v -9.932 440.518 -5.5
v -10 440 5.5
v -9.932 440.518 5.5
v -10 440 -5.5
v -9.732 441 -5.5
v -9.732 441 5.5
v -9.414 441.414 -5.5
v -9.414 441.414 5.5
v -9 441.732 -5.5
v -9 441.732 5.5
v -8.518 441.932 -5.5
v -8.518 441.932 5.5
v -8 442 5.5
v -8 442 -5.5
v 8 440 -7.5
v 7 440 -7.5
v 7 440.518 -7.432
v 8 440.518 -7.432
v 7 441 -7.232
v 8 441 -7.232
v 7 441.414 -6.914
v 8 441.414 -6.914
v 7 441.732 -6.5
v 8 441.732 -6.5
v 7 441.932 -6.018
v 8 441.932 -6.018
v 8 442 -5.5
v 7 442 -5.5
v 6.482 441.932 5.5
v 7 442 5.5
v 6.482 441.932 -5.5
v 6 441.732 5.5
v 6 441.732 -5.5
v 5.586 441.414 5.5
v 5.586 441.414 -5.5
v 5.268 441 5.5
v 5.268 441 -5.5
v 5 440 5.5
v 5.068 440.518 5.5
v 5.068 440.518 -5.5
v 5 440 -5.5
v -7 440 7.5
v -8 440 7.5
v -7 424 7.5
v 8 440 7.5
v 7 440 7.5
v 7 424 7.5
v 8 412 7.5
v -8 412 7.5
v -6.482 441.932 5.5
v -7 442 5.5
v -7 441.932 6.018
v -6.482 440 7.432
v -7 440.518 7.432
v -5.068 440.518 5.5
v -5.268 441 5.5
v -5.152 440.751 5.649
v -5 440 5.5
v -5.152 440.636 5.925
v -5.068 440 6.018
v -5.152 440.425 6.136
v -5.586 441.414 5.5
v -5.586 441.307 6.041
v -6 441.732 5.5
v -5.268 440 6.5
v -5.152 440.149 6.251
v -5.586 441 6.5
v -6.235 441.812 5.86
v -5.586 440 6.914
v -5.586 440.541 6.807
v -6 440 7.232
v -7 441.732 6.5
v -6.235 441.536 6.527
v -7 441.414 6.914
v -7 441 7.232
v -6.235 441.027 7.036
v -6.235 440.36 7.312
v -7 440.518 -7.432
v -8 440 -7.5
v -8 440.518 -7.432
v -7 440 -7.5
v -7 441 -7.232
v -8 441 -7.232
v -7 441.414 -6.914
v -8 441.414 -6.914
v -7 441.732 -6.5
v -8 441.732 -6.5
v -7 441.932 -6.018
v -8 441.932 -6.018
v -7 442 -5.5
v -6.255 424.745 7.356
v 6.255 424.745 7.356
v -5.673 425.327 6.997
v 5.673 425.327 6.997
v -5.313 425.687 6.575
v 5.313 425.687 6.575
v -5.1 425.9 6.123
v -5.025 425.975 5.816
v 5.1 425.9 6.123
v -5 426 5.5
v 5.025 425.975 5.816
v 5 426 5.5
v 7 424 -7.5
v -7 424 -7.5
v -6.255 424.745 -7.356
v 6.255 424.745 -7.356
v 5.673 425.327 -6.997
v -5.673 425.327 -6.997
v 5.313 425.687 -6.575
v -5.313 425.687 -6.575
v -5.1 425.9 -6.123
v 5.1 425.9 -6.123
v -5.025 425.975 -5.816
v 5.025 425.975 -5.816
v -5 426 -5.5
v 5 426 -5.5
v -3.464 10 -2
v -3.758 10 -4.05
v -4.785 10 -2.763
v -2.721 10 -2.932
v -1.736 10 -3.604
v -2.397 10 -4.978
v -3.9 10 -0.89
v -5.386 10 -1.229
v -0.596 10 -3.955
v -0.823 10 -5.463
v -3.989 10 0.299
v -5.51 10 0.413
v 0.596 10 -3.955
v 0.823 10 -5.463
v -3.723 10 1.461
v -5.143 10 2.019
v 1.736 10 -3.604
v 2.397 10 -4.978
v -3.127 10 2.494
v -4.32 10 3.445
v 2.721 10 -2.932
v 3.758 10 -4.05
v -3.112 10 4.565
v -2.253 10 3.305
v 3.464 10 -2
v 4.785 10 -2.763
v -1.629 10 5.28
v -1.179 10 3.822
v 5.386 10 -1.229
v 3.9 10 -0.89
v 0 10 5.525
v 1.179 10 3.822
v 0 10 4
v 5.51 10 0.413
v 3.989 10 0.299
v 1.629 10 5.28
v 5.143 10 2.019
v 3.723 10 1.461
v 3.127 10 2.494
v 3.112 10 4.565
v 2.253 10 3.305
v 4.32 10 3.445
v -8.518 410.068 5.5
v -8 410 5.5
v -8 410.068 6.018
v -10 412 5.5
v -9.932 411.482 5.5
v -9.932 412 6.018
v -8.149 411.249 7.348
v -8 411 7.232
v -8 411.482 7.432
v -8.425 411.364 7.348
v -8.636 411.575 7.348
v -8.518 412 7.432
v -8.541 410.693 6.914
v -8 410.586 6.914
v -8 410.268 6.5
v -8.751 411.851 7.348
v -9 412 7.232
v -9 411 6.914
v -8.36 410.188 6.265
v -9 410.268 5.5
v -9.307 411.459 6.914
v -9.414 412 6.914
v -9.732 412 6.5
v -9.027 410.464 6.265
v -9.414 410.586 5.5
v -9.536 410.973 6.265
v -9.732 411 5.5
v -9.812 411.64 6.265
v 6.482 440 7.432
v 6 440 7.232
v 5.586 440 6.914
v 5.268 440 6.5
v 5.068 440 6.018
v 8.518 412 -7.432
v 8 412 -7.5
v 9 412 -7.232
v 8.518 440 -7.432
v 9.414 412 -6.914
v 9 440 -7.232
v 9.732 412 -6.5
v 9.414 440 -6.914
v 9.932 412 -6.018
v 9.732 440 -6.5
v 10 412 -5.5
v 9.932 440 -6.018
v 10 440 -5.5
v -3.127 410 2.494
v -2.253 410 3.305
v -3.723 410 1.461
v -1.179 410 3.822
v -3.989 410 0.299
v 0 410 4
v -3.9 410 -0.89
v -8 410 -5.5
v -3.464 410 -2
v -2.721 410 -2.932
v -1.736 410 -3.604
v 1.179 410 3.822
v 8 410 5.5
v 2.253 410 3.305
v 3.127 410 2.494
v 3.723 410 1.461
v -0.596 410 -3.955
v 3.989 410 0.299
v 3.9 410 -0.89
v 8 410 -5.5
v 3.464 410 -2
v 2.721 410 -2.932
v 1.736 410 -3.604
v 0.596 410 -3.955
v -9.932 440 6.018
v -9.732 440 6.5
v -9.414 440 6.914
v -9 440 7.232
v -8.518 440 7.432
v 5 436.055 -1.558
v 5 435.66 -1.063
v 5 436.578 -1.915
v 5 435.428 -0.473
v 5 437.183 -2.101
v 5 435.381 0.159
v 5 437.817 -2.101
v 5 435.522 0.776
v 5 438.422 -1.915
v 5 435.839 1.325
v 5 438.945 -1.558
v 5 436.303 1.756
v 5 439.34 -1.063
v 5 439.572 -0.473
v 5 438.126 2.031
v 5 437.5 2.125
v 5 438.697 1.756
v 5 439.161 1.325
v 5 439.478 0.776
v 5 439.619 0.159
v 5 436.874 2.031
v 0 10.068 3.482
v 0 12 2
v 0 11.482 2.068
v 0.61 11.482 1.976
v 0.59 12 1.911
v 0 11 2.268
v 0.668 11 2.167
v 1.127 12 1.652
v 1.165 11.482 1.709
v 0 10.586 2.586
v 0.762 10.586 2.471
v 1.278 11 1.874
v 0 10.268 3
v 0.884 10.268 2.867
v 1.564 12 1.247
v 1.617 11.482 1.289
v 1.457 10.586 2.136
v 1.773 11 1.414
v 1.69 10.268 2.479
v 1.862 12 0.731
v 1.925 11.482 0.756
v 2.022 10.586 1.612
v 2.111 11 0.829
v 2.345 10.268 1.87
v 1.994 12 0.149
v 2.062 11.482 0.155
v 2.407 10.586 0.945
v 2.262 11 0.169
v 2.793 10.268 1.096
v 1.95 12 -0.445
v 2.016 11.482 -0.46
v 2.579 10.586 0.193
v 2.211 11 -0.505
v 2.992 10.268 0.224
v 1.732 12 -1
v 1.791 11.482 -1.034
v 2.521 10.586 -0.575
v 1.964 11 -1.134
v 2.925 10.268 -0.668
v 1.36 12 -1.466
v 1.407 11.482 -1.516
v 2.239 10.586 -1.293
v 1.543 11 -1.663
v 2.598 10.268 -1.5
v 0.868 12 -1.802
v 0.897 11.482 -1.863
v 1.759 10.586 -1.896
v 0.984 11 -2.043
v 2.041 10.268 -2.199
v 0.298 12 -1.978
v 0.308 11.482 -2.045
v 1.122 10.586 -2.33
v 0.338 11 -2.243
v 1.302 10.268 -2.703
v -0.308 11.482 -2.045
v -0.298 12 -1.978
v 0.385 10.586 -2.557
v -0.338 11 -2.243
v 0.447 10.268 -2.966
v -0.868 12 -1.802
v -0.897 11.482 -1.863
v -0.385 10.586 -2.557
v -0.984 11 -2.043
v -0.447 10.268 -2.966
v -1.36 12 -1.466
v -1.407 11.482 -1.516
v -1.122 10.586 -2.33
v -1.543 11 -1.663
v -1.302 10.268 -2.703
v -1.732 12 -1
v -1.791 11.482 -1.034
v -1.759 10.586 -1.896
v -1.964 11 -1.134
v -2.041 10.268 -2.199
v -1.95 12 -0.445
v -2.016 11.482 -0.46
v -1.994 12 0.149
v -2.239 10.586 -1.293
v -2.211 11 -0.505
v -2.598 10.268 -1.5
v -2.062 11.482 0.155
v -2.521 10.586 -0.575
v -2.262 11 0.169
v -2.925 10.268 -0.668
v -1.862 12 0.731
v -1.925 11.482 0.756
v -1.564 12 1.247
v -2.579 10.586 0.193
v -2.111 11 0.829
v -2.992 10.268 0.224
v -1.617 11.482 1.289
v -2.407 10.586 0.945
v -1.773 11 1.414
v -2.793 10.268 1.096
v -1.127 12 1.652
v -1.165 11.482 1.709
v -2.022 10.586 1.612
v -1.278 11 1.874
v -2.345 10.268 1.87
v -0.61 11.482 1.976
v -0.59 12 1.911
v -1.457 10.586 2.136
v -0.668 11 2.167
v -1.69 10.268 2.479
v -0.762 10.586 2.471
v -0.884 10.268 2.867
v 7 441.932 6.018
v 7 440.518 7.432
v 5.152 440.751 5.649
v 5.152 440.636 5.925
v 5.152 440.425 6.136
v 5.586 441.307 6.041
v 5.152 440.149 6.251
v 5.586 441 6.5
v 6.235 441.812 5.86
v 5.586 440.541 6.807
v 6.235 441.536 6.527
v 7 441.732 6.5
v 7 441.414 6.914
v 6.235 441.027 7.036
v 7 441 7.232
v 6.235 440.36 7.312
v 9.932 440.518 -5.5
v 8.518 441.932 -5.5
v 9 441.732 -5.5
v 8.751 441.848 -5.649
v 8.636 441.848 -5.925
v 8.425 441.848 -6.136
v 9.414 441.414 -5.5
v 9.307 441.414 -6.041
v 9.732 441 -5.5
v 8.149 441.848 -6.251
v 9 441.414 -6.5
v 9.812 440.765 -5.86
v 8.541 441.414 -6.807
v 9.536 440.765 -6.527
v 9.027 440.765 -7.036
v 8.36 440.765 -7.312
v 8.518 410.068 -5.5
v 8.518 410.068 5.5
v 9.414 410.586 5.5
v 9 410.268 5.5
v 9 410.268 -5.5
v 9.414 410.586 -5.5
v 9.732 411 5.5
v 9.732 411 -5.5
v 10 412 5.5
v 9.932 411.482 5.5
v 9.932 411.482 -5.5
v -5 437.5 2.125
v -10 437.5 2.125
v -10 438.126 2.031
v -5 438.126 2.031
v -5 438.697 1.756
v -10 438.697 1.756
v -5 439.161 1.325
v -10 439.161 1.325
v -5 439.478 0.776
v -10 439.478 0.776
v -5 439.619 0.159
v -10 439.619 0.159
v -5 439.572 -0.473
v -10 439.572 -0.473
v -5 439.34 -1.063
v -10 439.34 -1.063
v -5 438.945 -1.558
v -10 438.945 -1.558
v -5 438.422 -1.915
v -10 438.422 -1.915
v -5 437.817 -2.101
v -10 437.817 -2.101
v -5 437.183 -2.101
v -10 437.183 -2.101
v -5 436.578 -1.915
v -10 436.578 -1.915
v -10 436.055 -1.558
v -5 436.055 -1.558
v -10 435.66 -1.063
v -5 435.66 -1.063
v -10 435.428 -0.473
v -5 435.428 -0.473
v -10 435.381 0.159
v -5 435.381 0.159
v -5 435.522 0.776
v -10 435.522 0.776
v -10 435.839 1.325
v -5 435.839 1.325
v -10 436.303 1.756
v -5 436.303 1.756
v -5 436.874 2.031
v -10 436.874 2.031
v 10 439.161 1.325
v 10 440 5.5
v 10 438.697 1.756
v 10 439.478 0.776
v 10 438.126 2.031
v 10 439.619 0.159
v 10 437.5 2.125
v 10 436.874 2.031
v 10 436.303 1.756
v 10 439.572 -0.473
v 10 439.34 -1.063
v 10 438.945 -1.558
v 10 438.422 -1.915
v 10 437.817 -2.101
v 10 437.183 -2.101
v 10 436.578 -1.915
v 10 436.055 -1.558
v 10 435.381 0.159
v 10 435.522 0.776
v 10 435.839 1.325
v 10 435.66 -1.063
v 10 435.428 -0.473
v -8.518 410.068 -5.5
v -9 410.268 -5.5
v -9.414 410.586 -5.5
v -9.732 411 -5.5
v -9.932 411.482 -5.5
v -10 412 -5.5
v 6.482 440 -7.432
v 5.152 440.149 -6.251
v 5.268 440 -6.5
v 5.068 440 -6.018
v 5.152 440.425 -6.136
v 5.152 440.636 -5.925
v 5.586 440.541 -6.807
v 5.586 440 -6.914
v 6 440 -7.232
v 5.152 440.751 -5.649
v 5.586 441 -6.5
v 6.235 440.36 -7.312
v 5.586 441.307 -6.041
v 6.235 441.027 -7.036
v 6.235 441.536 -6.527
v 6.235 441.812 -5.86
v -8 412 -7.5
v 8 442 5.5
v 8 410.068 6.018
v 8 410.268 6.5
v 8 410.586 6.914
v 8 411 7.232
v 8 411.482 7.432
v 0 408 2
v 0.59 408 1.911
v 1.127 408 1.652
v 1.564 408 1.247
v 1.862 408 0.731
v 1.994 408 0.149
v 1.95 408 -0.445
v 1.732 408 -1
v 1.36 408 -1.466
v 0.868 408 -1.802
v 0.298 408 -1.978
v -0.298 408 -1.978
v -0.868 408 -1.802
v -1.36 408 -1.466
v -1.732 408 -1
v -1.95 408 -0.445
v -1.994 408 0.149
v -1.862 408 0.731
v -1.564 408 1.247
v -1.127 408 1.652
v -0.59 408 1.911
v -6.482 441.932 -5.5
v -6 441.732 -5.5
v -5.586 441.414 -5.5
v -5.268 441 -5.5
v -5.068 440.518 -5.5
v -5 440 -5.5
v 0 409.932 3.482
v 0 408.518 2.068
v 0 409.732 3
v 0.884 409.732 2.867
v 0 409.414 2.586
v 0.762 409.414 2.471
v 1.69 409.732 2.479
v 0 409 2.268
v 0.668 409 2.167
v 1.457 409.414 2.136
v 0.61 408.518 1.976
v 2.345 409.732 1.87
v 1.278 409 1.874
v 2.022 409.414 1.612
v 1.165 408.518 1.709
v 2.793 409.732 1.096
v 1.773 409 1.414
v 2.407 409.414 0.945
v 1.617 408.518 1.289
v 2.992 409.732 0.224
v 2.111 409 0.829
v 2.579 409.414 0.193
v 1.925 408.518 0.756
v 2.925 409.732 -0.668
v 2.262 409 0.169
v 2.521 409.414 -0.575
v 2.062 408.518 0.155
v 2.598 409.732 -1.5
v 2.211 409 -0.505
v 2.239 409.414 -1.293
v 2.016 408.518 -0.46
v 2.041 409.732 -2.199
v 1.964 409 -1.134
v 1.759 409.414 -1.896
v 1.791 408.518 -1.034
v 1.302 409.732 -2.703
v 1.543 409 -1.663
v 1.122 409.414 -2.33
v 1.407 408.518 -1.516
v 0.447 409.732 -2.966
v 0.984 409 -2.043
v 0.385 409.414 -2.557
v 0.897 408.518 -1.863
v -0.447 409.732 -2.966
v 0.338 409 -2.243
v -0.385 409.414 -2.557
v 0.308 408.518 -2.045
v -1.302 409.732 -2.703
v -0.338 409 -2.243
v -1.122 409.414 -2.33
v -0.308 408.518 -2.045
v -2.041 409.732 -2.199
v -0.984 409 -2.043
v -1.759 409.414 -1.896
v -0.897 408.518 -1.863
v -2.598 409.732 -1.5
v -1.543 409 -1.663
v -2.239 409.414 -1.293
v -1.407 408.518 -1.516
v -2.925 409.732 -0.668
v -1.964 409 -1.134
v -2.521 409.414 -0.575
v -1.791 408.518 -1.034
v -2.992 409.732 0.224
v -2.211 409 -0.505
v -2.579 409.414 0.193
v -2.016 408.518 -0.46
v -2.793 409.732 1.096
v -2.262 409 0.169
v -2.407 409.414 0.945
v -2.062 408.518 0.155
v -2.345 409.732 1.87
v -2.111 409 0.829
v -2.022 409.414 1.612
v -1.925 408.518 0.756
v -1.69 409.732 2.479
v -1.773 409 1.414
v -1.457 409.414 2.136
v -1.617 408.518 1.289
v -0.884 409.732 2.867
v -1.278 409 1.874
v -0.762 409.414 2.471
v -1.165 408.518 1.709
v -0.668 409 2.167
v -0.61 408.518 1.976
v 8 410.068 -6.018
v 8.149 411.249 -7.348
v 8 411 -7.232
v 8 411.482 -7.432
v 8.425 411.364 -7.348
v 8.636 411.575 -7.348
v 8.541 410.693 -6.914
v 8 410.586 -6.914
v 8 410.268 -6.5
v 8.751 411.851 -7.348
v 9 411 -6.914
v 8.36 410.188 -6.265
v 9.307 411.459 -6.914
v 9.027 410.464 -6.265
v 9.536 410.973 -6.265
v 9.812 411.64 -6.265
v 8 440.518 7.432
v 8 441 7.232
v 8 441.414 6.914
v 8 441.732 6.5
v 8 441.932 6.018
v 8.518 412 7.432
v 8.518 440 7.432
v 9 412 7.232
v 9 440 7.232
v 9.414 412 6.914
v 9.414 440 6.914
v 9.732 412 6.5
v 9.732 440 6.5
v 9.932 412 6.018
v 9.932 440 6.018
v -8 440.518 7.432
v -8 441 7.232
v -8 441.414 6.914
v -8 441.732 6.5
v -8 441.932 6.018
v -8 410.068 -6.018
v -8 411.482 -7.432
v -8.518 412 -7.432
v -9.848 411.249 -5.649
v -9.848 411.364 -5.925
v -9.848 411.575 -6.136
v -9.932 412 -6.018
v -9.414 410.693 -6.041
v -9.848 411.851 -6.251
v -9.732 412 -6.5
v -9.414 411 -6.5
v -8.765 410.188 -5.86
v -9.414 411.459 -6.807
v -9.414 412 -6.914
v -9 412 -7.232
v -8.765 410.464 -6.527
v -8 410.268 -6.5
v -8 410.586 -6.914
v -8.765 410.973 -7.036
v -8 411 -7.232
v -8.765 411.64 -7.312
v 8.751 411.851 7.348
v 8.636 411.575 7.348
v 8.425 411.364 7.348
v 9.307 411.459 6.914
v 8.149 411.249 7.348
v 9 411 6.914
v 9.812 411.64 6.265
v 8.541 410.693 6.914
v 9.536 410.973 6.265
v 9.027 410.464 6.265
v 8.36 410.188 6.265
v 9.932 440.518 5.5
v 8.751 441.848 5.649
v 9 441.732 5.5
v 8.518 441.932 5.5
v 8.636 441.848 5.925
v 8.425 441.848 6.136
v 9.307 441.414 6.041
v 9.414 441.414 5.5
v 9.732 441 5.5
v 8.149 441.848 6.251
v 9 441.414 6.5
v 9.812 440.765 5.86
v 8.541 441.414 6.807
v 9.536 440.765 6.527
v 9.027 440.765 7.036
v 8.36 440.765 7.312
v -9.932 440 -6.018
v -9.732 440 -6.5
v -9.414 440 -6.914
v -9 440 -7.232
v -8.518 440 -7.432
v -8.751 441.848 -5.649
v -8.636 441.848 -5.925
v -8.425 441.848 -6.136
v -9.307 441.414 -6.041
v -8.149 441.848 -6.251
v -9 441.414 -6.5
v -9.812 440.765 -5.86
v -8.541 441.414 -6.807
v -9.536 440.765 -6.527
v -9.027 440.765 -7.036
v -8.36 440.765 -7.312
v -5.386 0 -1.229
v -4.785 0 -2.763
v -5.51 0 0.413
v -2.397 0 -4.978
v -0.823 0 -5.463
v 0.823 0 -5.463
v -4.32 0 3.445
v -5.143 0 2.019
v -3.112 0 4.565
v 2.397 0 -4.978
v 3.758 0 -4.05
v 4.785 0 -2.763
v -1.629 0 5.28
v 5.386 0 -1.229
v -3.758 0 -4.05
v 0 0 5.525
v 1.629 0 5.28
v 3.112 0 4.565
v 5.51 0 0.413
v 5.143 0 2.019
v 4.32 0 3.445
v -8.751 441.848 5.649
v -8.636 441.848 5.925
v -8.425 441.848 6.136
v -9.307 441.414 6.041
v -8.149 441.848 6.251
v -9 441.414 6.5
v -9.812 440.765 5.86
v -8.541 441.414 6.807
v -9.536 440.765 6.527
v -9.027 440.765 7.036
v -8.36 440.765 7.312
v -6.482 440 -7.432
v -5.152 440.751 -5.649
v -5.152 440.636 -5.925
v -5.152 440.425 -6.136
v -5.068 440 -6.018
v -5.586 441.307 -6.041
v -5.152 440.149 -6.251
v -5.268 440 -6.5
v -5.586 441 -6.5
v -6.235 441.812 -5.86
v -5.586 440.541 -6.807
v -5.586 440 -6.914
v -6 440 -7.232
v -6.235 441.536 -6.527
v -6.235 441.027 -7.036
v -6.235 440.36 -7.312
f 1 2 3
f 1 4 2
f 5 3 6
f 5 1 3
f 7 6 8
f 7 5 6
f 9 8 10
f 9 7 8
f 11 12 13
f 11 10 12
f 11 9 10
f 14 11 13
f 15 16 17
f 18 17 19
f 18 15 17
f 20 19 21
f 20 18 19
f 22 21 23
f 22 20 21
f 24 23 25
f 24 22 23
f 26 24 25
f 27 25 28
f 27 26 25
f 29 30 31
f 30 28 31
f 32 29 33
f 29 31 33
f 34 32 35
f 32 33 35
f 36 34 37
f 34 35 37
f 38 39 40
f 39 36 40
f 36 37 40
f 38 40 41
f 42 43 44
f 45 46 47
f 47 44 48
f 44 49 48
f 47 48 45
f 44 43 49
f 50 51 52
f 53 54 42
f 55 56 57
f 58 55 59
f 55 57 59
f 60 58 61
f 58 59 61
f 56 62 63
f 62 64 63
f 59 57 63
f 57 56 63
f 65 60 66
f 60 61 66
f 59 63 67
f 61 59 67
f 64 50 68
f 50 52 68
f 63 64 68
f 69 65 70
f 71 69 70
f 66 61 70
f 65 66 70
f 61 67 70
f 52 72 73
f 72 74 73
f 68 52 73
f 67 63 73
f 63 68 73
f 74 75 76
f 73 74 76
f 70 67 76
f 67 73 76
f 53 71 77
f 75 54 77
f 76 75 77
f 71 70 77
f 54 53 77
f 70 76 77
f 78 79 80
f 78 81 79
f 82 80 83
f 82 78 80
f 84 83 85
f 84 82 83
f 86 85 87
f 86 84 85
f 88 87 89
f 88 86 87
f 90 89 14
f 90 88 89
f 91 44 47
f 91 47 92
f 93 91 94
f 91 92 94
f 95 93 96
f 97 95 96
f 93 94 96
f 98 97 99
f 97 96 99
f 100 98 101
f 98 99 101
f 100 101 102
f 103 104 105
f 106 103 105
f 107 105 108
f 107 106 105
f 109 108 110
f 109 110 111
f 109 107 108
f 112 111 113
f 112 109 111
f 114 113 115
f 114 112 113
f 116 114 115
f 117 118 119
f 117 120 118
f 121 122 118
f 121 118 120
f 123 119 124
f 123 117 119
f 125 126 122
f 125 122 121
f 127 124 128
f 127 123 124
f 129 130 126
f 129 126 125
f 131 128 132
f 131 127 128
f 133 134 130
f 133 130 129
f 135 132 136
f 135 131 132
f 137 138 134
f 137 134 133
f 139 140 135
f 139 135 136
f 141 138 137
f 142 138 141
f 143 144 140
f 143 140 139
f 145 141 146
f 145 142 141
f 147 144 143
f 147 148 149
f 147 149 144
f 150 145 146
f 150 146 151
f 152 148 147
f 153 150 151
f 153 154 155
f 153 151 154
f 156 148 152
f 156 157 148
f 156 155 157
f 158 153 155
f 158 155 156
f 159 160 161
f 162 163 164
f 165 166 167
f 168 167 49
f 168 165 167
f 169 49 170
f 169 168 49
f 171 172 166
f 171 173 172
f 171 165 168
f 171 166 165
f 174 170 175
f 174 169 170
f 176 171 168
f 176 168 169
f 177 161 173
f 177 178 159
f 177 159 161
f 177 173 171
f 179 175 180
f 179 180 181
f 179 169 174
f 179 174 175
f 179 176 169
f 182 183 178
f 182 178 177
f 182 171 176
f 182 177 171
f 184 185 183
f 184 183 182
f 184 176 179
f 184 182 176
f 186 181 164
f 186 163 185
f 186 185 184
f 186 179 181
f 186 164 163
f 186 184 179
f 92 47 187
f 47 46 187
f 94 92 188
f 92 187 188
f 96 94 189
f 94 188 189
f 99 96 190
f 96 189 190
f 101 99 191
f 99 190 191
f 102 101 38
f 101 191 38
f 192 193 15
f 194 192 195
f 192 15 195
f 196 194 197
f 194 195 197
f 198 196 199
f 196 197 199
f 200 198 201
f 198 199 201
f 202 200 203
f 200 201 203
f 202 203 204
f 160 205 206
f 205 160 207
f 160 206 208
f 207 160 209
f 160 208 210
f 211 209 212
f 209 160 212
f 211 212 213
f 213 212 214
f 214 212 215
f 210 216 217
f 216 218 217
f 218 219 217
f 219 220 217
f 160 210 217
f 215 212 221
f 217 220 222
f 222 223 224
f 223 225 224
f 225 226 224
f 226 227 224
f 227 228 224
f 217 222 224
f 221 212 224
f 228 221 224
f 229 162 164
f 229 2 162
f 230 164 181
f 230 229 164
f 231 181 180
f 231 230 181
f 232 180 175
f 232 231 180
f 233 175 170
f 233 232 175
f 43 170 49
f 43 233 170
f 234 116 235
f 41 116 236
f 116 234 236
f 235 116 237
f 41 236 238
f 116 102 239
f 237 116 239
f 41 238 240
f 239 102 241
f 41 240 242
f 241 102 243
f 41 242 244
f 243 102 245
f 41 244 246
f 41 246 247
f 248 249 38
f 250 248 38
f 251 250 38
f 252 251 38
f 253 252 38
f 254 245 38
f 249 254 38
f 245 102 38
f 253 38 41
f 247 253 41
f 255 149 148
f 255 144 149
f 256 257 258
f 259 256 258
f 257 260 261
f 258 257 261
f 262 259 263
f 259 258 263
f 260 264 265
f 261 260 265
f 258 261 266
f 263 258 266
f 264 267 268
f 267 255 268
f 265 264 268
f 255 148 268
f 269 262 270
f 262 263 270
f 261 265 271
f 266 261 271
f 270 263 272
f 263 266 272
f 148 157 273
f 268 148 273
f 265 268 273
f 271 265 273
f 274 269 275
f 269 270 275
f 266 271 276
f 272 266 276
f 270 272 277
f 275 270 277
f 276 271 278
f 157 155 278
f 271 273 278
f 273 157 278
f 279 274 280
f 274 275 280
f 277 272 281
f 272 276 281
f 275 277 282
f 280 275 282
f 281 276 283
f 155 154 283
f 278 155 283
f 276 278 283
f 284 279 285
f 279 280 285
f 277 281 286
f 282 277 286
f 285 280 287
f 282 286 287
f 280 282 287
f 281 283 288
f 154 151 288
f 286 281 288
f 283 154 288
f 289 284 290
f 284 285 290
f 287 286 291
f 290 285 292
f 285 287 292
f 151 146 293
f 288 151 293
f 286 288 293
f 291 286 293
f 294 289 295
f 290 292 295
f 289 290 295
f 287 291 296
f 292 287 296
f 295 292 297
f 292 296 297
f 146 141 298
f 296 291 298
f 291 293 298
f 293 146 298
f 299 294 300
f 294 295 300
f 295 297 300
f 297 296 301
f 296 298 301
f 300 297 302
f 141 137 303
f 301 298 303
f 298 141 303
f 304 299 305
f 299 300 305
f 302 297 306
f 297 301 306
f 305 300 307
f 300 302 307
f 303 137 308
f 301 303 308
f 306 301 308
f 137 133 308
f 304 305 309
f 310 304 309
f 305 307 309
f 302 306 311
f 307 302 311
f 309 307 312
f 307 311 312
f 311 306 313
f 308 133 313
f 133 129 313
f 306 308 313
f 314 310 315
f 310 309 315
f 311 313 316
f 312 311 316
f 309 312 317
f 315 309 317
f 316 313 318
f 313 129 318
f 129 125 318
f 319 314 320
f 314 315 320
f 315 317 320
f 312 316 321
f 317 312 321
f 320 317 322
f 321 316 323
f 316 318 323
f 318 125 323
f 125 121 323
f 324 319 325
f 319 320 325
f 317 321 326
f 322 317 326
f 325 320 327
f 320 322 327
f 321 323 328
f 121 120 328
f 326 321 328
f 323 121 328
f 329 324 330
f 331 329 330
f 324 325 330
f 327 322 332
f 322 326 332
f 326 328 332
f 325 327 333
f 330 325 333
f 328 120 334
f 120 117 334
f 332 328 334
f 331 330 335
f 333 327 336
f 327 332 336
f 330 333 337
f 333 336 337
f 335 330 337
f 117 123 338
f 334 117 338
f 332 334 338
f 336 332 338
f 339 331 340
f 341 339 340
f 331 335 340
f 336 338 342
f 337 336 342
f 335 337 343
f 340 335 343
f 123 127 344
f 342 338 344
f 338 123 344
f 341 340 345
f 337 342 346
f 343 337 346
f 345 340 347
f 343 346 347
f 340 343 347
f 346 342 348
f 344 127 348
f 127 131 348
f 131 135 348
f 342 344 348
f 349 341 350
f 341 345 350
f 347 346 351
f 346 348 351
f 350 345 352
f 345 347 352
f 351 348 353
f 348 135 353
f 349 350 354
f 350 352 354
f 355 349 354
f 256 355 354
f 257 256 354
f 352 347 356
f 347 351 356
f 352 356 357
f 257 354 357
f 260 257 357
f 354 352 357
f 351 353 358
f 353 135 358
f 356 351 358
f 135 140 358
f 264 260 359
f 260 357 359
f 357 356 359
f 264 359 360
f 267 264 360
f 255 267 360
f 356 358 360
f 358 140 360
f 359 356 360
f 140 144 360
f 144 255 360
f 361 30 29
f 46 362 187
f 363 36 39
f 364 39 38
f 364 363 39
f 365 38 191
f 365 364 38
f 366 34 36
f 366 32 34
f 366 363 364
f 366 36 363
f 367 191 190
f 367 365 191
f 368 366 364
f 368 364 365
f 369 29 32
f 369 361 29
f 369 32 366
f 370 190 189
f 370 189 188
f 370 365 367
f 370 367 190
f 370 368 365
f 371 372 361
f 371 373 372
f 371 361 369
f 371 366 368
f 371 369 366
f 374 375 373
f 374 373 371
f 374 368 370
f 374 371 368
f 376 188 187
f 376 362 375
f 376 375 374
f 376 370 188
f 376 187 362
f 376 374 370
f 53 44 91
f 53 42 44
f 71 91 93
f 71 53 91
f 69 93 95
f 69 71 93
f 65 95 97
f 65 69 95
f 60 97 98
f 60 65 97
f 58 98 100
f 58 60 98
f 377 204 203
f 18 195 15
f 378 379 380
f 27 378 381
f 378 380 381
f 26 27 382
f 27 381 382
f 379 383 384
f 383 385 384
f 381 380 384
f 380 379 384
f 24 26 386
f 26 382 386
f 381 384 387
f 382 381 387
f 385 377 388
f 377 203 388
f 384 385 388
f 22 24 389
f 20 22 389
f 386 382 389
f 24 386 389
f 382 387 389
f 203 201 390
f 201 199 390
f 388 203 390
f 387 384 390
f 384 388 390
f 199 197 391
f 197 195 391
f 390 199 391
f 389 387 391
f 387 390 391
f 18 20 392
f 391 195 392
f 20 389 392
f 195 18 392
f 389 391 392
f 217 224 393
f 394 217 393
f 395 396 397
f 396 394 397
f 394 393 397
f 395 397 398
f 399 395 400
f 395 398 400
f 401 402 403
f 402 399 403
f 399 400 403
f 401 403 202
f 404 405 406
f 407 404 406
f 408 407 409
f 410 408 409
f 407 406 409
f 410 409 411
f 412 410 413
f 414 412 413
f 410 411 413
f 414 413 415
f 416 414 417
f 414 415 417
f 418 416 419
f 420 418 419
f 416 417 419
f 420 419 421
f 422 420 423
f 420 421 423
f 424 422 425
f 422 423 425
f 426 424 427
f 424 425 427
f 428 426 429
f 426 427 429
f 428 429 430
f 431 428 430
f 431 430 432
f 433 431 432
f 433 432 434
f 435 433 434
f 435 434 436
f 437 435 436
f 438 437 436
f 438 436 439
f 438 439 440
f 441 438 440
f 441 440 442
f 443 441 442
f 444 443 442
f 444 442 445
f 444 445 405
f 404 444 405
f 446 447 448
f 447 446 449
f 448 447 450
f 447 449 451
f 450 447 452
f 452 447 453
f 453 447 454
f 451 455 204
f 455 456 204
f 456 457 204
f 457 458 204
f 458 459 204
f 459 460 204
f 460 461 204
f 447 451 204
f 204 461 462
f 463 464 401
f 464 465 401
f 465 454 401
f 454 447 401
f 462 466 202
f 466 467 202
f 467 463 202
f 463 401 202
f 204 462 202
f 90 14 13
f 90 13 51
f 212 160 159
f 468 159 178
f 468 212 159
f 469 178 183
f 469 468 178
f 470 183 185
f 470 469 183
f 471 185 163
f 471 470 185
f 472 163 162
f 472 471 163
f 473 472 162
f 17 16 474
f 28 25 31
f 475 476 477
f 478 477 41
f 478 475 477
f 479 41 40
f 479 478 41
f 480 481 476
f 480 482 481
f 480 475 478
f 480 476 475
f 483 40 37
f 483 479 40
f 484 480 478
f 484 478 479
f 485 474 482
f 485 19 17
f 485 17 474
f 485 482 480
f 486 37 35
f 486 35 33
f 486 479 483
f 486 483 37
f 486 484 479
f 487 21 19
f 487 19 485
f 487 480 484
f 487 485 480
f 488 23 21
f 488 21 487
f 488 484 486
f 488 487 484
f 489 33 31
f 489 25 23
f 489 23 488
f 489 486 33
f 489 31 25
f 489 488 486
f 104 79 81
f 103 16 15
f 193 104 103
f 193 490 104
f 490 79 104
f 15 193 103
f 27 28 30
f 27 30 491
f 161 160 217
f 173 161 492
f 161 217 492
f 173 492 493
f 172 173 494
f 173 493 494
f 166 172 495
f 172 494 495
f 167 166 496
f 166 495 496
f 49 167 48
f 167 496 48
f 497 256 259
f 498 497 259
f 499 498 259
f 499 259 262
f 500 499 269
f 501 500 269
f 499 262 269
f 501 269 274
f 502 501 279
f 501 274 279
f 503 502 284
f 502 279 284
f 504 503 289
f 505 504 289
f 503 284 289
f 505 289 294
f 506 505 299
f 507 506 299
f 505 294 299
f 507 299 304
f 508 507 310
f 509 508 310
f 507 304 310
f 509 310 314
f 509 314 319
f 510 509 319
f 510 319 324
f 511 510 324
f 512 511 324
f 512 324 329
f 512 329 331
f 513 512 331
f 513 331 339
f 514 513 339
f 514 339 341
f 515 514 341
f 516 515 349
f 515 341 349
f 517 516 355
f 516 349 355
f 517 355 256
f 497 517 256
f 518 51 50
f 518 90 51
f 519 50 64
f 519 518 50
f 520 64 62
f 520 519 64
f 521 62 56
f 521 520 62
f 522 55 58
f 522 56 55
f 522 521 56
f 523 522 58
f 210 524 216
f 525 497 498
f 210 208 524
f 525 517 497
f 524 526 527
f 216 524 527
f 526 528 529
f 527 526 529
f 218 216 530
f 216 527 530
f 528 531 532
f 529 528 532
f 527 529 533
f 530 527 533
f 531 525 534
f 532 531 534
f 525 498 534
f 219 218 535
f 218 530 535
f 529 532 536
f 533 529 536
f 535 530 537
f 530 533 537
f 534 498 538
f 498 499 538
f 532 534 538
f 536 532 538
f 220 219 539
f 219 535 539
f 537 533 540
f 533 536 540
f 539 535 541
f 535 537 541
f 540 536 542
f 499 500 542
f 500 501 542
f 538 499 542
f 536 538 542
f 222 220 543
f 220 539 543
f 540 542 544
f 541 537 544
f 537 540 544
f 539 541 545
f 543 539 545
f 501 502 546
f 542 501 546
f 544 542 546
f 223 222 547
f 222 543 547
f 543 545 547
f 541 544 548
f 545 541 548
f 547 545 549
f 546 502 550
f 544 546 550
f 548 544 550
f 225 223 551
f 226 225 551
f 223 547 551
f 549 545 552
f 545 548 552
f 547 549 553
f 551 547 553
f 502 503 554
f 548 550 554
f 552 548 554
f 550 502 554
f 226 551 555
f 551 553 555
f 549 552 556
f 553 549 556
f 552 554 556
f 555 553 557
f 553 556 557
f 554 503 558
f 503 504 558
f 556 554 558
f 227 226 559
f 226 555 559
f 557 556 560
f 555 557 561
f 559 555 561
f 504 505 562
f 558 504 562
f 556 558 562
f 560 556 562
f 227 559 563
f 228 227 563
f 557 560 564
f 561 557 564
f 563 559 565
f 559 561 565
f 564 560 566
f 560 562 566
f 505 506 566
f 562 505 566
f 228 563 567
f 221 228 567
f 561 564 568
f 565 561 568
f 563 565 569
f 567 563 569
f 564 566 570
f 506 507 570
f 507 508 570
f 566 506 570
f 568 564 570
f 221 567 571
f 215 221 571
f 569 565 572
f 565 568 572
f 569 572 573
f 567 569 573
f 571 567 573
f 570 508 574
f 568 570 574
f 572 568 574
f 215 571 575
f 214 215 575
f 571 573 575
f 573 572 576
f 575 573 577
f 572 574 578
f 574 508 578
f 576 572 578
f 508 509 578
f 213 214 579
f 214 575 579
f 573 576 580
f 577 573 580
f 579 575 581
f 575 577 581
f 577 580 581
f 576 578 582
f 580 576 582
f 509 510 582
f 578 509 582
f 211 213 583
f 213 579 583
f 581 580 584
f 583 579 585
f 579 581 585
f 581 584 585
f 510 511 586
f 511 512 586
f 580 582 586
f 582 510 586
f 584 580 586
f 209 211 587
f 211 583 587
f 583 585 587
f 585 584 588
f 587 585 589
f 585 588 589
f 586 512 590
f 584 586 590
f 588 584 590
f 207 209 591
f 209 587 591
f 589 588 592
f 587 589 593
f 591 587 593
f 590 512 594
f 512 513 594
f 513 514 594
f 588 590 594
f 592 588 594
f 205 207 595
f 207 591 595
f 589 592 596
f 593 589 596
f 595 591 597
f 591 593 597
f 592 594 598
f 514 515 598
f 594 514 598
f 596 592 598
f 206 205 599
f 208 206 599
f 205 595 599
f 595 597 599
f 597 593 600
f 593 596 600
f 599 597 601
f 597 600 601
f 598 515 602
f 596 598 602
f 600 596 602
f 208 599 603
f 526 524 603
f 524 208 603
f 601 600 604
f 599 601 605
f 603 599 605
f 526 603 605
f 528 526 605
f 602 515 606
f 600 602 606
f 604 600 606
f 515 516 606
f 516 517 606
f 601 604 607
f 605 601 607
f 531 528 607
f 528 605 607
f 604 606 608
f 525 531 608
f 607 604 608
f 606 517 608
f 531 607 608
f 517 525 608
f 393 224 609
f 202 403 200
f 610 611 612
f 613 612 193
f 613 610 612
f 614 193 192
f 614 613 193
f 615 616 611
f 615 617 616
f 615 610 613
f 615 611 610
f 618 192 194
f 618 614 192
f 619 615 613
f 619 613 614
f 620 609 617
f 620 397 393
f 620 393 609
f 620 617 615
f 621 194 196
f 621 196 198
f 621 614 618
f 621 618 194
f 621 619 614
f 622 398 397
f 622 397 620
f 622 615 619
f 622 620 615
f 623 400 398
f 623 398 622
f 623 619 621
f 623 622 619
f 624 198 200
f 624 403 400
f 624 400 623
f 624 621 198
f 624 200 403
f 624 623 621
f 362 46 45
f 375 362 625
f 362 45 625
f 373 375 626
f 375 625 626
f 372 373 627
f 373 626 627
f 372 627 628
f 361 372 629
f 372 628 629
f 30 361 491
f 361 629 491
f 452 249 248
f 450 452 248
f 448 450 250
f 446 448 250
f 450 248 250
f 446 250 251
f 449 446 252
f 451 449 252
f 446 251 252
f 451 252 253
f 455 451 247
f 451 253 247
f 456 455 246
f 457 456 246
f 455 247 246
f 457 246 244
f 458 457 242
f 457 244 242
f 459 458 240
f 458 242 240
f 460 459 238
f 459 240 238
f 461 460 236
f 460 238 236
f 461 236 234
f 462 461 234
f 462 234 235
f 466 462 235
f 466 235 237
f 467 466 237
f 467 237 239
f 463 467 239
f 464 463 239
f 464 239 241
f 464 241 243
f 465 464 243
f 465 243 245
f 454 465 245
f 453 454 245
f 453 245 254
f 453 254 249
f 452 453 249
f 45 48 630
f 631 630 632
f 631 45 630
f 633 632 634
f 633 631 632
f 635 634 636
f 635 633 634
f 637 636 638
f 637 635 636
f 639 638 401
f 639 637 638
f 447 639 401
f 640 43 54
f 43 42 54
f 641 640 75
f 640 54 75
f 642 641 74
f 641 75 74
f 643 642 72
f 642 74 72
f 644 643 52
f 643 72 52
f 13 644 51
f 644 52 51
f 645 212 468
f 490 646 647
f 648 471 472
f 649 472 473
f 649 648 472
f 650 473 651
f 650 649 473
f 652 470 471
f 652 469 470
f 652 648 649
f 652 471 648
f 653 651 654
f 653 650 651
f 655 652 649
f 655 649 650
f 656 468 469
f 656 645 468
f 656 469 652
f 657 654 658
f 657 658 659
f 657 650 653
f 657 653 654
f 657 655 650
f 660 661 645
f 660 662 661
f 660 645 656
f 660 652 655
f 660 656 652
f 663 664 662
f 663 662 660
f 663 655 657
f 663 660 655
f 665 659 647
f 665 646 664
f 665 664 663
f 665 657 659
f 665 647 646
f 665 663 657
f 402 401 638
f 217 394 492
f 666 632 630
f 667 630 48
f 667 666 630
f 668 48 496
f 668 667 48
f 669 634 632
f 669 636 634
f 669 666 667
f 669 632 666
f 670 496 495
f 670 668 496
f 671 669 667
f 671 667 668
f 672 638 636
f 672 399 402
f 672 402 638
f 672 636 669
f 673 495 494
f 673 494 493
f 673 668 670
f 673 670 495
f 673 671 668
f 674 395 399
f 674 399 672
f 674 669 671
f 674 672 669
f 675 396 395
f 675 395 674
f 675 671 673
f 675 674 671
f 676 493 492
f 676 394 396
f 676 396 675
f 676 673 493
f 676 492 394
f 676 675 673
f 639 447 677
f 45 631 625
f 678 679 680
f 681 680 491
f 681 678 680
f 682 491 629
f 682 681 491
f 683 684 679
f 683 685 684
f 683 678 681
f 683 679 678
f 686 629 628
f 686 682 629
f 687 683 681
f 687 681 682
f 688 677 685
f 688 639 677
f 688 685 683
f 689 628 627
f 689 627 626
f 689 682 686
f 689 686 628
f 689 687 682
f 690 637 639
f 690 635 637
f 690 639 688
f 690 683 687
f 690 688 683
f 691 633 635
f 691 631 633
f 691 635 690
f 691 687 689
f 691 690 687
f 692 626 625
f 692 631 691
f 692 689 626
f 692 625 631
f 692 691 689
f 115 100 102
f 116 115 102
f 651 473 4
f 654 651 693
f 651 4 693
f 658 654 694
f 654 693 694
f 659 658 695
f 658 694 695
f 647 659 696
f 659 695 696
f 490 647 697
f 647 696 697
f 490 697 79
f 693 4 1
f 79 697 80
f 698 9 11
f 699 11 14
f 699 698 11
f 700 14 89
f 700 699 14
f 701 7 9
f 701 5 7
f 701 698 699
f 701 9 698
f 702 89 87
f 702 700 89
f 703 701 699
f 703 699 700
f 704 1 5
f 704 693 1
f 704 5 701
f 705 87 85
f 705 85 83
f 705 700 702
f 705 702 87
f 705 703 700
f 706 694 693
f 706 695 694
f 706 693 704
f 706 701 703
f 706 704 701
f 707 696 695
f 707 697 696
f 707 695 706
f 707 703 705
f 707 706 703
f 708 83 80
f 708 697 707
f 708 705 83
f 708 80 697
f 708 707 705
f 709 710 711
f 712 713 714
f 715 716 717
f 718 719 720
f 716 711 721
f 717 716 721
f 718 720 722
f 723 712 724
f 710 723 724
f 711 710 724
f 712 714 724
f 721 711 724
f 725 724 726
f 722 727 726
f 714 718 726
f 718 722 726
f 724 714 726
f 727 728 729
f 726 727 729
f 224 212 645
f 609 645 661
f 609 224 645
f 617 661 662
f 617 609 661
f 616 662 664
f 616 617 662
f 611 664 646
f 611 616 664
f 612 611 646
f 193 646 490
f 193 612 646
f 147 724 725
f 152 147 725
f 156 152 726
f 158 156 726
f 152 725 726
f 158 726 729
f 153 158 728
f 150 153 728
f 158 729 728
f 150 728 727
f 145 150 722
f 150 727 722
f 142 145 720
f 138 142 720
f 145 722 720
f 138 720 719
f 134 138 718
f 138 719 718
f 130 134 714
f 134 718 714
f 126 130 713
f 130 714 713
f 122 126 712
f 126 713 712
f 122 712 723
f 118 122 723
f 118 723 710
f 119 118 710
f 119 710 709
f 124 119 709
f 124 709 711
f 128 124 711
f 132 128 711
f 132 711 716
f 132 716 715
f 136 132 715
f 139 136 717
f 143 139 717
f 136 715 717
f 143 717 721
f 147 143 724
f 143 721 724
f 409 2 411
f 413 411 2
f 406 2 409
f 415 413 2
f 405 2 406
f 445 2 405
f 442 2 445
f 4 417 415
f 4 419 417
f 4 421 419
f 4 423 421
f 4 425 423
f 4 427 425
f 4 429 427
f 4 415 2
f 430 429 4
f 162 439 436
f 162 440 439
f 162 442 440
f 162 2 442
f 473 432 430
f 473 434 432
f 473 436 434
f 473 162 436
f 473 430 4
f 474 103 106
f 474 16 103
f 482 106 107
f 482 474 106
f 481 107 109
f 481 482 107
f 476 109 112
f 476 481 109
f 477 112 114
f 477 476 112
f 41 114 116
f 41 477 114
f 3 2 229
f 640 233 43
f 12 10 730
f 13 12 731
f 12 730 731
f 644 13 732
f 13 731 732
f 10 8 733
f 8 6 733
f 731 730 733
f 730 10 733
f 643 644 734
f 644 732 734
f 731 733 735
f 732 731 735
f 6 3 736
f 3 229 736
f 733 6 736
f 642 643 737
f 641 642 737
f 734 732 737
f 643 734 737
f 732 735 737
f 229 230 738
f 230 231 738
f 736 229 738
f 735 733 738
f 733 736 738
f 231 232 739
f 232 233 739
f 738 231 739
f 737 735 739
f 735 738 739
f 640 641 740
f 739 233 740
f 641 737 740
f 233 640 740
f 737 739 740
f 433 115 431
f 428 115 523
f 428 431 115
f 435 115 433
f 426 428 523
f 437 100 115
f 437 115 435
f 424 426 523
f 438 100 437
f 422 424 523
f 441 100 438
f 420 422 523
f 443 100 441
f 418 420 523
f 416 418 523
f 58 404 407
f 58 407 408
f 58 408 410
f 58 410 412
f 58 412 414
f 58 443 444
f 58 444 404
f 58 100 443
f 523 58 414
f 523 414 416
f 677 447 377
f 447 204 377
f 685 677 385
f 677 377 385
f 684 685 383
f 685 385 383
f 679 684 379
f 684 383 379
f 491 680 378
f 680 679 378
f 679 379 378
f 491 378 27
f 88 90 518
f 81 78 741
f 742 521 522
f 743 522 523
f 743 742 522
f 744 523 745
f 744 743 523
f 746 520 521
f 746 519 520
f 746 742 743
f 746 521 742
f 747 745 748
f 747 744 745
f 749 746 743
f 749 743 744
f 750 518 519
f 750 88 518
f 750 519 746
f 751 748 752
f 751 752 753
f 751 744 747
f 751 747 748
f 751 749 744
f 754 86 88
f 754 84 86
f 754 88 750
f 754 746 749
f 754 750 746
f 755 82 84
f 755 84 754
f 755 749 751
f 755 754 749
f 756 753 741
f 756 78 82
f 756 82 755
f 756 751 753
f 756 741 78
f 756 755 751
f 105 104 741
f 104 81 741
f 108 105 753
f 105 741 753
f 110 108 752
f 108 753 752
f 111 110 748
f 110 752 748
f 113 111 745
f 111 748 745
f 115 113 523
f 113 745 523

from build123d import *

# Parameters (mm, degrees)
SKETCH1_R                     = 5.525
CORK_STOPPER_VACUMMPUMP_DEPTH = 10
SKETCH3_R                     = 2
LONGTHINSHAFT_DEPTH           = 400
SKETCH4_W                     = 20
SKETCH4_H                     = 15
BOSS_EXTRUDE3_DEPTH           = 32
CUT_EXTRUDE2_REACH            = 444.367
SKETCH5_W                     = 10
SKETCH5_H                     = 16
SKETCH7_R                     = 2.125
CUT_EXTRUDE3_DEPTH            = 20
FILLET1_R                     = 2
FILLET2_R                     = 2
FILLET3_R                     = 2


with BuildPart() as part:
    # Sketch1 → Cork/Stopper/VacummPump (new body)
    with BuildSketch(Plane(origin=(0, 0, 0), x_dir=(1, 0, 0), z_dir=(0, 1, 0))):
        with Locations(Location((0, 0, 0), (0, 0, 270))):
            Circle(SKETCH1_R)
    extrude(amount=CORK_STOPPER_VACUMMPUMP_DEPTH)

    # Sketch3 → LongThinShaft (add)
    with BuildSketch(Plane(origin=(0, 10, 0), x_dir=(1, 0, 0), z_dir=(0, 1, 0))):
        with Locations(Location((0, 0, 0), (0, 0, 270))):
            Circle(SKETCH3_R)
    extrude(amount=LONGTHINSHAFT_DEPTH)

    # Sketch4 → Boss-Extrude3 (add)
    with BuildSketch(Plane(origin=(0, 410, 0), x_dir=(1, 0, 0), z_dir=(0, 1, 0))):
        Rectangle(SKETCH4_W, SKETCH4_H)
    extrude(amount=BOSS_EXTRUDE3_DEPTH)

    # Sketch5 → Cut-Extrude2 (cut, up to next)
    with BuildSketch(Plane.XY.offset(7.5), mode=Mode.PRIVATE) as cut_extrude2_sk1:
        with Locations((0, 434)):
            Rectangle(SKETCH5_W, SKETCH5_H)
    cut_extrude2_tool1 = extrude(cut_extrude2_sk1.sketch, amount=-CUT_EXTRUDE2_REACH, mode=Mode.PRIVATE) & part.part
    add(cut_extrude2_tool1.solids().sort_by_distance((0, 434, 7.5))[0], mode=Mode.SUBTRACT)

    # Sketch7 → Cut-Extrude3 (cut)
    with BuildSketch(Plane.ZY.offset(10)):
        with Locations((0, 437.5)):
            Circle(SKETCH7_R)
    extrude(amount=-CUT_EXTRUDE3_DEPTH, mode=Mode.SUBTRACT)

    # Fillet1
    fillet1_edges = [part.edges().sort_by_distance(p)[0] for p in [
        (0, 410, -2),
    ]]
    fillet(fillet1_edges, radius=FILLET1_R)

    # Fillet2
    fillet2_edges = [part.edges().sort_by_distance(p)[0] for p in [
        (10, 410, 0),
        (10, 426, 7.5),
        (0, 410, -7.5),
        (10, 426, -7.5),
        (-10, 410, 0),
        (-10, 426, -7.5),
        (0, 410, 7.5),
        (-10, 426, 7.5),
        (10, 442, 0),
        (7.5, 442, -7.5),
        (-10, 442, 0),
        (-7.5, 442, 7.5),
        (-7.5, 442, -7.5),
        (7.5, 442, 7.5),
        (-5, 442, 0),
        (5, 434, -7.5),
        (5, 442, 0),
        (5, 434, 7.5),
        (-5, 434, 7.5),
        (0, 426, 7.5),
        (0, 426, -7.5),
        (-5, 434, -7.5),
    ]]
    fillet(fillet2_edges, radius=FILLET2_R)

    # Fillet3
    fillet3_edges = [part.edges().sort_by_distance(p)[0] for p in [
        (0, 10, -2),
    ]]
    fillet(fillet3_edges, radius=FILLET3_R)


solid = part.part
